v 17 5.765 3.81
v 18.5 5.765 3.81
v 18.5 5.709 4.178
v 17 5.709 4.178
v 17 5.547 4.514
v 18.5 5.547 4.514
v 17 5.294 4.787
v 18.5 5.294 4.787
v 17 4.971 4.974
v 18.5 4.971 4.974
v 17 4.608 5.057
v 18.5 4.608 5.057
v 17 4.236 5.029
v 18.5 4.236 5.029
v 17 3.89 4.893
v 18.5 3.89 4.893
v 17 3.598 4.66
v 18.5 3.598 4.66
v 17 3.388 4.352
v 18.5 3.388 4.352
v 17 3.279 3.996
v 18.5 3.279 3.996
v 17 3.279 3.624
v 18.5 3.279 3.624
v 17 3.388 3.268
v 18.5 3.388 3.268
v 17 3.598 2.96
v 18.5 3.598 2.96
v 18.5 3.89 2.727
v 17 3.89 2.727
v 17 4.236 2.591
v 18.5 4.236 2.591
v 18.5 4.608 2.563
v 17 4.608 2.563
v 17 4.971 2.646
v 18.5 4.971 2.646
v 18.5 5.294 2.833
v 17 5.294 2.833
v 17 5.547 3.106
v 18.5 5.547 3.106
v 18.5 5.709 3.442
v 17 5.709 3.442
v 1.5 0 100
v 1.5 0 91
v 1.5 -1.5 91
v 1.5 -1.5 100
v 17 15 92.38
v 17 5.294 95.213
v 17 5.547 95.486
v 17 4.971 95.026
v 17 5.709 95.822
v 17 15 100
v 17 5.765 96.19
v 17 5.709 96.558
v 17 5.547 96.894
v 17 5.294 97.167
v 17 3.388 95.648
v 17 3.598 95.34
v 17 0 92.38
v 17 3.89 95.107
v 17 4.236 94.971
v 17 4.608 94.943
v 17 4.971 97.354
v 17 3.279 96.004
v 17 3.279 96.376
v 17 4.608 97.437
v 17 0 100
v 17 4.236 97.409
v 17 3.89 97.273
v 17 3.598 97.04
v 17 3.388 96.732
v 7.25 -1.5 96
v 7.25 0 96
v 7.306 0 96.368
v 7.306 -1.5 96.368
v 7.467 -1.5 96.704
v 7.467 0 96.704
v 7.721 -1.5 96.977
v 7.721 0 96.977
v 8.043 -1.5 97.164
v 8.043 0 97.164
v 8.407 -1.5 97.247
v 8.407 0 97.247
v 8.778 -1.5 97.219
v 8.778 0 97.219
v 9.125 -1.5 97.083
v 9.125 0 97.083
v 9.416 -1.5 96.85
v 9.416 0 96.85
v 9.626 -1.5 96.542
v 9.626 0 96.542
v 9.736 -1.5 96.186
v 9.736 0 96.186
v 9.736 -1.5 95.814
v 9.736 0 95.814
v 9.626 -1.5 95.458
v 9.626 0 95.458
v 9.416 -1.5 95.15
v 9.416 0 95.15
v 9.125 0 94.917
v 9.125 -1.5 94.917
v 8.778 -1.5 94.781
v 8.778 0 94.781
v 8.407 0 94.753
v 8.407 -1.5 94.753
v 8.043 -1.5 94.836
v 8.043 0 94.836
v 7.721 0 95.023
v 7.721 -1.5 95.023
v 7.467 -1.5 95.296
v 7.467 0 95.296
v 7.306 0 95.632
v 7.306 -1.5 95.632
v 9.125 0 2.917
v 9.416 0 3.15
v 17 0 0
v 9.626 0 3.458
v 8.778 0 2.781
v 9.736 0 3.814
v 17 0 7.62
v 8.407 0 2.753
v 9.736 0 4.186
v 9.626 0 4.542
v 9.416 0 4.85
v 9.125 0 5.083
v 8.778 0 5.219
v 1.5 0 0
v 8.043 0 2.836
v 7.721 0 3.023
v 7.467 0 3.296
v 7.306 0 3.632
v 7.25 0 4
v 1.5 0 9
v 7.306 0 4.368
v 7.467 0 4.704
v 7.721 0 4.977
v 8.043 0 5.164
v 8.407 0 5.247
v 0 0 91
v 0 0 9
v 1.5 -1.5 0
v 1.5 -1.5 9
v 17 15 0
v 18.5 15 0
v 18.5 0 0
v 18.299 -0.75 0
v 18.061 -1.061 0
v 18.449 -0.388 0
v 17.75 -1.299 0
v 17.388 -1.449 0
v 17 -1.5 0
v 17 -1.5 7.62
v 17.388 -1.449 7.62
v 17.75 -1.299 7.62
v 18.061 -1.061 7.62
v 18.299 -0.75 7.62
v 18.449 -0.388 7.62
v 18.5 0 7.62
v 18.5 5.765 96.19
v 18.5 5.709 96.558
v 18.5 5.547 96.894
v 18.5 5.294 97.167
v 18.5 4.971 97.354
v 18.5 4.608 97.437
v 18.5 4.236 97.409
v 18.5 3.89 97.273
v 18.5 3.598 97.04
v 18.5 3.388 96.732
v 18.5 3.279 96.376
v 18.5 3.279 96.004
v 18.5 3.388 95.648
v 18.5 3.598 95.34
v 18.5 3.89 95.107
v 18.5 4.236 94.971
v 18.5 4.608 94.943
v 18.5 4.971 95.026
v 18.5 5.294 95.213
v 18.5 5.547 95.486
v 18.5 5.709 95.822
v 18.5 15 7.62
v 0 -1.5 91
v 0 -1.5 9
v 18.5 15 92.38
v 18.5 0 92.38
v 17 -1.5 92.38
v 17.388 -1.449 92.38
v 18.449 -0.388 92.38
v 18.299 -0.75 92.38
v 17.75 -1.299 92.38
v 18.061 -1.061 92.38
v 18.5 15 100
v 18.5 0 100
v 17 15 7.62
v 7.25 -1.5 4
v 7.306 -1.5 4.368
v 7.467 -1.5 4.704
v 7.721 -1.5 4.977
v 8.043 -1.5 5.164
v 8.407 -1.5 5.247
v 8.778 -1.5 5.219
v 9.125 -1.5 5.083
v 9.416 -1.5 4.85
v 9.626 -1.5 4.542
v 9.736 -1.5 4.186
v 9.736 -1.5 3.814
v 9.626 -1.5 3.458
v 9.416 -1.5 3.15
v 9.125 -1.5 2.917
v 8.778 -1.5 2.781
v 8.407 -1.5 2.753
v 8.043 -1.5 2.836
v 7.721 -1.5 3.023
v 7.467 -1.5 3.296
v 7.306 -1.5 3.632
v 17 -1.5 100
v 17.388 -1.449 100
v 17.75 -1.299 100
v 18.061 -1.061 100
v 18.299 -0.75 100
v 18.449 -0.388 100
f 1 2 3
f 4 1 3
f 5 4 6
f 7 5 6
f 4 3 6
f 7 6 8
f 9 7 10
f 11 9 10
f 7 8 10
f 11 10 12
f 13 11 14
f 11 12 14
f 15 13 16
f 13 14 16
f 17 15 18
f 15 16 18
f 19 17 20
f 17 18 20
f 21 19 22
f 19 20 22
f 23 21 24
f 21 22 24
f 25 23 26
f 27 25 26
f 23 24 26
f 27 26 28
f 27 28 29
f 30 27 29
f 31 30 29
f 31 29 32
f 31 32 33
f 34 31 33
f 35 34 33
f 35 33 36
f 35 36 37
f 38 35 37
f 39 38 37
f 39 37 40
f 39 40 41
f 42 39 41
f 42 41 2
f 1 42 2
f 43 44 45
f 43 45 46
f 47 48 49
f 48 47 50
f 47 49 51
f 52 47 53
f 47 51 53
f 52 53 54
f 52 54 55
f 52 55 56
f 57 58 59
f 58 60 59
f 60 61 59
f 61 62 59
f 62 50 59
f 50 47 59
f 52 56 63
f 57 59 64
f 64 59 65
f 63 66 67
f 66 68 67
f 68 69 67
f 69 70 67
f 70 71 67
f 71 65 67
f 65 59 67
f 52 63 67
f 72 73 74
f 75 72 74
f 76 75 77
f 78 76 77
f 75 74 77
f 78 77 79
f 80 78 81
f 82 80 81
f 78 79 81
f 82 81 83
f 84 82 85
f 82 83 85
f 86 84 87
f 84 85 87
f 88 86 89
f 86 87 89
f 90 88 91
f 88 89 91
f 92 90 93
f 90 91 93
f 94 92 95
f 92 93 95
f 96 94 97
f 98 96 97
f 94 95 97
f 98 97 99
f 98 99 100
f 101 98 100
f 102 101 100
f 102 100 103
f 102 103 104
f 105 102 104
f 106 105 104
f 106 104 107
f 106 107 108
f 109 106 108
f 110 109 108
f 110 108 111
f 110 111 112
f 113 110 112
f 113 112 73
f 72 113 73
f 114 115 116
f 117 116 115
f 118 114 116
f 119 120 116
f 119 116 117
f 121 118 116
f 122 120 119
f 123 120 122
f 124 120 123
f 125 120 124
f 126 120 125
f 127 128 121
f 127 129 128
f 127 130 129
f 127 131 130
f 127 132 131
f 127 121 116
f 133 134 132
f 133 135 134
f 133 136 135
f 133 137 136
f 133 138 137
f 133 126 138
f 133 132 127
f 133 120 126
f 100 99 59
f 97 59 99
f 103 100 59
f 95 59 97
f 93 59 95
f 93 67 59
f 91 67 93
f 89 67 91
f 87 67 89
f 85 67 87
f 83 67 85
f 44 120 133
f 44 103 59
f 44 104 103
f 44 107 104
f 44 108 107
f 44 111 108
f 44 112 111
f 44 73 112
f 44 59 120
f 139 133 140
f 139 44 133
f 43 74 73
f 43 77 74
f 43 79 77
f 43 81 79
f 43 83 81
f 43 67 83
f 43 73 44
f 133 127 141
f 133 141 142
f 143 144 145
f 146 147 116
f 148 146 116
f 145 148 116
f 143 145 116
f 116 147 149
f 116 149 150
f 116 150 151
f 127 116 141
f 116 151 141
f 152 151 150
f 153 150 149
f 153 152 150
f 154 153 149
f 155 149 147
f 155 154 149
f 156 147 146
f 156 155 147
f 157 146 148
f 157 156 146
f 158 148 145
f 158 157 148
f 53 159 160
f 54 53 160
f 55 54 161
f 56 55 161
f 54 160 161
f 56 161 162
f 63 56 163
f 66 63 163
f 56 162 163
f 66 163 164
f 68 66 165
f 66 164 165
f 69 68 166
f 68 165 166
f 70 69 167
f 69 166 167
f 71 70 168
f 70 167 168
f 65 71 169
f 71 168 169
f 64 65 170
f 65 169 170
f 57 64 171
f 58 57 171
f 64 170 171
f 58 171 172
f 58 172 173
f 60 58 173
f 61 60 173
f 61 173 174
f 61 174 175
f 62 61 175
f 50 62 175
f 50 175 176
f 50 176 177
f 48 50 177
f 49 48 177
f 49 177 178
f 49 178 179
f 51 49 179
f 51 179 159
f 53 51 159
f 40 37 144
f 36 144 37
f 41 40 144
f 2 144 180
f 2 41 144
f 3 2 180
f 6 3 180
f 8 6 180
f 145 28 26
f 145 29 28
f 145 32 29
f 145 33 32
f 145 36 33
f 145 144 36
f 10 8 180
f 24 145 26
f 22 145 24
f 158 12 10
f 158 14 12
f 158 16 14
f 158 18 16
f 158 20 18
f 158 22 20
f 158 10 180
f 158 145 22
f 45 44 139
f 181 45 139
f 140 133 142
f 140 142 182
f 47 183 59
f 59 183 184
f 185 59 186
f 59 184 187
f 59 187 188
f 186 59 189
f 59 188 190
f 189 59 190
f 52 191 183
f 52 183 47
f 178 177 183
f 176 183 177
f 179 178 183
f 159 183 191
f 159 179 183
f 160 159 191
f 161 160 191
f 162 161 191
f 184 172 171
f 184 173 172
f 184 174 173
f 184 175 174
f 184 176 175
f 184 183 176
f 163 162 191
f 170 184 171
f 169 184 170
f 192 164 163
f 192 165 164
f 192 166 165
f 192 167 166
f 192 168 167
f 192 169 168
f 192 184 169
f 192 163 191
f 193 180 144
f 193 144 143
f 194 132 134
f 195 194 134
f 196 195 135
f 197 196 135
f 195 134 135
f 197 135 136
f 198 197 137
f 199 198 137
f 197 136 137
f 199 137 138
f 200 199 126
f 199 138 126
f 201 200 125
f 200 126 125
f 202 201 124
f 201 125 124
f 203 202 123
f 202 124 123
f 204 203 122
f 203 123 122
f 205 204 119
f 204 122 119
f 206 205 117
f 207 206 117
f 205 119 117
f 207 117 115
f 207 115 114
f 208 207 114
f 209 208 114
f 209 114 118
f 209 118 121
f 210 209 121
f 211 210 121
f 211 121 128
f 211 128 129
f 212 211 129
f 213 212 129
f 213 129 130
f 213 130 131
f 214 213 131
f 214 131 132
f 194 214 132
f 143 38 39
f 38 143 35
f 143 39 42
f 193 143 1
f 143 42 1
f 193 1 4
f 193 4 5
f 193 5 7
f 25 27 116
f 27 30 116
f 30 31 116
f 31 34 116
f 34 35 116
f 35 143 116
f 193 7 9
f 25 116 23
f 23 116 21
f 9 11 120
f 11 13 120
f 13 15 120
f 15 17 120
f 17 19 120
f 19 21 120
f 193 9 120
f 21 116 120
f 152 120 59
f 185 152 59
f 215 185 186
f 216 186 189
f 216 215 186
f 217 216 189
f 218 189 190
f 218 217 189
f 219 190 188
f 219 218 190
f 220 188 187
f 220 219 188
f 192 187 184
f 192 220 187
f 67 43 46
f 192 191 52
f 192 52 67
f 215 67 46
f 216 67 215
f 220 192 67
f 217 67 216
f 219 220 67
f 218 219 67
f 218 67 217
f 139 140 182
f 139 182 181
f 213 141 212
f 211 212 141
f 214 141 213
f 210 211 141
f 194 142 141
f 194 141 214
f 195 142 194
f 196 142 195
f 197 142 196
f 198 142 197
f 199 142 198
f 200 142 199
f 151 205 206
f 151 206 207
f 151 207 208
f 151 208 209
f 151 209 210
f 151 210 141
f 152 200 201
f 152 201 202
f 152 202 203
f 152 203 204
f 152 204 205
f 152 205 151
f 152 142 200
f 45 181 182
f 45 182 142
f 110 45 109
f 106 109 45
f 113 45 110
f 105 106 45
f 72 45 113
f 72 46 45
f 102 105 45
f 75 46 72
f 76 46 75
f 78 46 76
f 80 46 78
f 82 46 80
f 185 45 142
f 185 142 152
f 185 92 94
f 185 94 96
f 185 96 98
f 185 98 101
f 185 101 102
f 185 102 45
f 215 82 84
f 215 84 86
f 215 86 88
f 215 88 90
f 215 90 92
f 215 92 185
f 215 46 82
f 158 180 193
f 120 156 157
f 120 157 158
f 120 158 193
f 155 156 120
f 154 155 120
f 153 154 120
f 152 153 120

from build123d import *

# Parameters (mm, degrees)
F0_W      = 17
F0_H      = 100
F1_DEPTH  = 1.5
F3_D      = 2.5
F4_W      = 1.5
F4_H      = 7.62
F5_ANGLE  = 90
F6_W      = 1.5
F6_H      = 7.62
F7_DEPTH  = 15
F9_D      = 2.5
F10_W     = 1.5
F10_H     = 9
F11_DEPTH = 1.501


with BuildPart() as f1:
    # F0 (on Front) → F1 (new body)
    with BuildSketch(Plane.XZ):
        with Locations((8.5, 50)):
            Rectangle(F0_W, F0_H)
    extrude(amount=F1_DEPTH)

    # F3 (through all)
    with Locations(Plane.XZ.offset(1.5)):
        with Locations((8.5, 96), (8.5, 4)):
            Hole(F3_D / 2)

    # F4 (on face) → F5 (revolve)
    with BuildSketch(Plane.YZ.offset(17)):
        with Locations((-0.75, 96.19)):
            Rectangle(F4_W, F4_H)
        with Locations((-0.75, 3.81)):
            Rectangle(F4_W, F4_H)
    revolve(axis=Axis((17, 0, 50), (0, 0, 1)), revolution_arc=F5_ANGLE)

    # F6 (on face) → F7 (join)
    with BuildSketch(Plane(origin=(0, 0, 0), x_dir=(-1, 0, 0), z_dir=(0, 1, 0))):
        with Locations((-17.75, 3.81)):
            Rectangle(F6_W, F6_H)
        with Locations((-17.75, 96.19)):
            Rectangle(F6_W, F6_H)
    extrude(amount=F7_DEPTH)

    # F9 (through all)
    with Locations(Plane(origin=(17, 0, 0), x_dir=(0, -1, 0), z_dir=(-1, 0, 0))):
        with Locations((-4.5145543722, 96.19), (-4.5145543722, 3.81)):
            Hole(F9_D / 2)

    # F10 (on face) → F11 (cut, through all)
    with BuildSketch(Plane(origin=(0, 0, 0), x_dir=(-1, 0, 0), z_dir=(0, 1, 0))):
        with Locations((-0.75, 95.5)):
            Rectangle(F10_W, F10_H)
        with Locations((-0.75, 4.5)):
            Rectangle(F10_W, F10_H)
    extrude(amount=-F11_DEPTH, mode=Mode.SUBTRACT)


solid = f1.part
